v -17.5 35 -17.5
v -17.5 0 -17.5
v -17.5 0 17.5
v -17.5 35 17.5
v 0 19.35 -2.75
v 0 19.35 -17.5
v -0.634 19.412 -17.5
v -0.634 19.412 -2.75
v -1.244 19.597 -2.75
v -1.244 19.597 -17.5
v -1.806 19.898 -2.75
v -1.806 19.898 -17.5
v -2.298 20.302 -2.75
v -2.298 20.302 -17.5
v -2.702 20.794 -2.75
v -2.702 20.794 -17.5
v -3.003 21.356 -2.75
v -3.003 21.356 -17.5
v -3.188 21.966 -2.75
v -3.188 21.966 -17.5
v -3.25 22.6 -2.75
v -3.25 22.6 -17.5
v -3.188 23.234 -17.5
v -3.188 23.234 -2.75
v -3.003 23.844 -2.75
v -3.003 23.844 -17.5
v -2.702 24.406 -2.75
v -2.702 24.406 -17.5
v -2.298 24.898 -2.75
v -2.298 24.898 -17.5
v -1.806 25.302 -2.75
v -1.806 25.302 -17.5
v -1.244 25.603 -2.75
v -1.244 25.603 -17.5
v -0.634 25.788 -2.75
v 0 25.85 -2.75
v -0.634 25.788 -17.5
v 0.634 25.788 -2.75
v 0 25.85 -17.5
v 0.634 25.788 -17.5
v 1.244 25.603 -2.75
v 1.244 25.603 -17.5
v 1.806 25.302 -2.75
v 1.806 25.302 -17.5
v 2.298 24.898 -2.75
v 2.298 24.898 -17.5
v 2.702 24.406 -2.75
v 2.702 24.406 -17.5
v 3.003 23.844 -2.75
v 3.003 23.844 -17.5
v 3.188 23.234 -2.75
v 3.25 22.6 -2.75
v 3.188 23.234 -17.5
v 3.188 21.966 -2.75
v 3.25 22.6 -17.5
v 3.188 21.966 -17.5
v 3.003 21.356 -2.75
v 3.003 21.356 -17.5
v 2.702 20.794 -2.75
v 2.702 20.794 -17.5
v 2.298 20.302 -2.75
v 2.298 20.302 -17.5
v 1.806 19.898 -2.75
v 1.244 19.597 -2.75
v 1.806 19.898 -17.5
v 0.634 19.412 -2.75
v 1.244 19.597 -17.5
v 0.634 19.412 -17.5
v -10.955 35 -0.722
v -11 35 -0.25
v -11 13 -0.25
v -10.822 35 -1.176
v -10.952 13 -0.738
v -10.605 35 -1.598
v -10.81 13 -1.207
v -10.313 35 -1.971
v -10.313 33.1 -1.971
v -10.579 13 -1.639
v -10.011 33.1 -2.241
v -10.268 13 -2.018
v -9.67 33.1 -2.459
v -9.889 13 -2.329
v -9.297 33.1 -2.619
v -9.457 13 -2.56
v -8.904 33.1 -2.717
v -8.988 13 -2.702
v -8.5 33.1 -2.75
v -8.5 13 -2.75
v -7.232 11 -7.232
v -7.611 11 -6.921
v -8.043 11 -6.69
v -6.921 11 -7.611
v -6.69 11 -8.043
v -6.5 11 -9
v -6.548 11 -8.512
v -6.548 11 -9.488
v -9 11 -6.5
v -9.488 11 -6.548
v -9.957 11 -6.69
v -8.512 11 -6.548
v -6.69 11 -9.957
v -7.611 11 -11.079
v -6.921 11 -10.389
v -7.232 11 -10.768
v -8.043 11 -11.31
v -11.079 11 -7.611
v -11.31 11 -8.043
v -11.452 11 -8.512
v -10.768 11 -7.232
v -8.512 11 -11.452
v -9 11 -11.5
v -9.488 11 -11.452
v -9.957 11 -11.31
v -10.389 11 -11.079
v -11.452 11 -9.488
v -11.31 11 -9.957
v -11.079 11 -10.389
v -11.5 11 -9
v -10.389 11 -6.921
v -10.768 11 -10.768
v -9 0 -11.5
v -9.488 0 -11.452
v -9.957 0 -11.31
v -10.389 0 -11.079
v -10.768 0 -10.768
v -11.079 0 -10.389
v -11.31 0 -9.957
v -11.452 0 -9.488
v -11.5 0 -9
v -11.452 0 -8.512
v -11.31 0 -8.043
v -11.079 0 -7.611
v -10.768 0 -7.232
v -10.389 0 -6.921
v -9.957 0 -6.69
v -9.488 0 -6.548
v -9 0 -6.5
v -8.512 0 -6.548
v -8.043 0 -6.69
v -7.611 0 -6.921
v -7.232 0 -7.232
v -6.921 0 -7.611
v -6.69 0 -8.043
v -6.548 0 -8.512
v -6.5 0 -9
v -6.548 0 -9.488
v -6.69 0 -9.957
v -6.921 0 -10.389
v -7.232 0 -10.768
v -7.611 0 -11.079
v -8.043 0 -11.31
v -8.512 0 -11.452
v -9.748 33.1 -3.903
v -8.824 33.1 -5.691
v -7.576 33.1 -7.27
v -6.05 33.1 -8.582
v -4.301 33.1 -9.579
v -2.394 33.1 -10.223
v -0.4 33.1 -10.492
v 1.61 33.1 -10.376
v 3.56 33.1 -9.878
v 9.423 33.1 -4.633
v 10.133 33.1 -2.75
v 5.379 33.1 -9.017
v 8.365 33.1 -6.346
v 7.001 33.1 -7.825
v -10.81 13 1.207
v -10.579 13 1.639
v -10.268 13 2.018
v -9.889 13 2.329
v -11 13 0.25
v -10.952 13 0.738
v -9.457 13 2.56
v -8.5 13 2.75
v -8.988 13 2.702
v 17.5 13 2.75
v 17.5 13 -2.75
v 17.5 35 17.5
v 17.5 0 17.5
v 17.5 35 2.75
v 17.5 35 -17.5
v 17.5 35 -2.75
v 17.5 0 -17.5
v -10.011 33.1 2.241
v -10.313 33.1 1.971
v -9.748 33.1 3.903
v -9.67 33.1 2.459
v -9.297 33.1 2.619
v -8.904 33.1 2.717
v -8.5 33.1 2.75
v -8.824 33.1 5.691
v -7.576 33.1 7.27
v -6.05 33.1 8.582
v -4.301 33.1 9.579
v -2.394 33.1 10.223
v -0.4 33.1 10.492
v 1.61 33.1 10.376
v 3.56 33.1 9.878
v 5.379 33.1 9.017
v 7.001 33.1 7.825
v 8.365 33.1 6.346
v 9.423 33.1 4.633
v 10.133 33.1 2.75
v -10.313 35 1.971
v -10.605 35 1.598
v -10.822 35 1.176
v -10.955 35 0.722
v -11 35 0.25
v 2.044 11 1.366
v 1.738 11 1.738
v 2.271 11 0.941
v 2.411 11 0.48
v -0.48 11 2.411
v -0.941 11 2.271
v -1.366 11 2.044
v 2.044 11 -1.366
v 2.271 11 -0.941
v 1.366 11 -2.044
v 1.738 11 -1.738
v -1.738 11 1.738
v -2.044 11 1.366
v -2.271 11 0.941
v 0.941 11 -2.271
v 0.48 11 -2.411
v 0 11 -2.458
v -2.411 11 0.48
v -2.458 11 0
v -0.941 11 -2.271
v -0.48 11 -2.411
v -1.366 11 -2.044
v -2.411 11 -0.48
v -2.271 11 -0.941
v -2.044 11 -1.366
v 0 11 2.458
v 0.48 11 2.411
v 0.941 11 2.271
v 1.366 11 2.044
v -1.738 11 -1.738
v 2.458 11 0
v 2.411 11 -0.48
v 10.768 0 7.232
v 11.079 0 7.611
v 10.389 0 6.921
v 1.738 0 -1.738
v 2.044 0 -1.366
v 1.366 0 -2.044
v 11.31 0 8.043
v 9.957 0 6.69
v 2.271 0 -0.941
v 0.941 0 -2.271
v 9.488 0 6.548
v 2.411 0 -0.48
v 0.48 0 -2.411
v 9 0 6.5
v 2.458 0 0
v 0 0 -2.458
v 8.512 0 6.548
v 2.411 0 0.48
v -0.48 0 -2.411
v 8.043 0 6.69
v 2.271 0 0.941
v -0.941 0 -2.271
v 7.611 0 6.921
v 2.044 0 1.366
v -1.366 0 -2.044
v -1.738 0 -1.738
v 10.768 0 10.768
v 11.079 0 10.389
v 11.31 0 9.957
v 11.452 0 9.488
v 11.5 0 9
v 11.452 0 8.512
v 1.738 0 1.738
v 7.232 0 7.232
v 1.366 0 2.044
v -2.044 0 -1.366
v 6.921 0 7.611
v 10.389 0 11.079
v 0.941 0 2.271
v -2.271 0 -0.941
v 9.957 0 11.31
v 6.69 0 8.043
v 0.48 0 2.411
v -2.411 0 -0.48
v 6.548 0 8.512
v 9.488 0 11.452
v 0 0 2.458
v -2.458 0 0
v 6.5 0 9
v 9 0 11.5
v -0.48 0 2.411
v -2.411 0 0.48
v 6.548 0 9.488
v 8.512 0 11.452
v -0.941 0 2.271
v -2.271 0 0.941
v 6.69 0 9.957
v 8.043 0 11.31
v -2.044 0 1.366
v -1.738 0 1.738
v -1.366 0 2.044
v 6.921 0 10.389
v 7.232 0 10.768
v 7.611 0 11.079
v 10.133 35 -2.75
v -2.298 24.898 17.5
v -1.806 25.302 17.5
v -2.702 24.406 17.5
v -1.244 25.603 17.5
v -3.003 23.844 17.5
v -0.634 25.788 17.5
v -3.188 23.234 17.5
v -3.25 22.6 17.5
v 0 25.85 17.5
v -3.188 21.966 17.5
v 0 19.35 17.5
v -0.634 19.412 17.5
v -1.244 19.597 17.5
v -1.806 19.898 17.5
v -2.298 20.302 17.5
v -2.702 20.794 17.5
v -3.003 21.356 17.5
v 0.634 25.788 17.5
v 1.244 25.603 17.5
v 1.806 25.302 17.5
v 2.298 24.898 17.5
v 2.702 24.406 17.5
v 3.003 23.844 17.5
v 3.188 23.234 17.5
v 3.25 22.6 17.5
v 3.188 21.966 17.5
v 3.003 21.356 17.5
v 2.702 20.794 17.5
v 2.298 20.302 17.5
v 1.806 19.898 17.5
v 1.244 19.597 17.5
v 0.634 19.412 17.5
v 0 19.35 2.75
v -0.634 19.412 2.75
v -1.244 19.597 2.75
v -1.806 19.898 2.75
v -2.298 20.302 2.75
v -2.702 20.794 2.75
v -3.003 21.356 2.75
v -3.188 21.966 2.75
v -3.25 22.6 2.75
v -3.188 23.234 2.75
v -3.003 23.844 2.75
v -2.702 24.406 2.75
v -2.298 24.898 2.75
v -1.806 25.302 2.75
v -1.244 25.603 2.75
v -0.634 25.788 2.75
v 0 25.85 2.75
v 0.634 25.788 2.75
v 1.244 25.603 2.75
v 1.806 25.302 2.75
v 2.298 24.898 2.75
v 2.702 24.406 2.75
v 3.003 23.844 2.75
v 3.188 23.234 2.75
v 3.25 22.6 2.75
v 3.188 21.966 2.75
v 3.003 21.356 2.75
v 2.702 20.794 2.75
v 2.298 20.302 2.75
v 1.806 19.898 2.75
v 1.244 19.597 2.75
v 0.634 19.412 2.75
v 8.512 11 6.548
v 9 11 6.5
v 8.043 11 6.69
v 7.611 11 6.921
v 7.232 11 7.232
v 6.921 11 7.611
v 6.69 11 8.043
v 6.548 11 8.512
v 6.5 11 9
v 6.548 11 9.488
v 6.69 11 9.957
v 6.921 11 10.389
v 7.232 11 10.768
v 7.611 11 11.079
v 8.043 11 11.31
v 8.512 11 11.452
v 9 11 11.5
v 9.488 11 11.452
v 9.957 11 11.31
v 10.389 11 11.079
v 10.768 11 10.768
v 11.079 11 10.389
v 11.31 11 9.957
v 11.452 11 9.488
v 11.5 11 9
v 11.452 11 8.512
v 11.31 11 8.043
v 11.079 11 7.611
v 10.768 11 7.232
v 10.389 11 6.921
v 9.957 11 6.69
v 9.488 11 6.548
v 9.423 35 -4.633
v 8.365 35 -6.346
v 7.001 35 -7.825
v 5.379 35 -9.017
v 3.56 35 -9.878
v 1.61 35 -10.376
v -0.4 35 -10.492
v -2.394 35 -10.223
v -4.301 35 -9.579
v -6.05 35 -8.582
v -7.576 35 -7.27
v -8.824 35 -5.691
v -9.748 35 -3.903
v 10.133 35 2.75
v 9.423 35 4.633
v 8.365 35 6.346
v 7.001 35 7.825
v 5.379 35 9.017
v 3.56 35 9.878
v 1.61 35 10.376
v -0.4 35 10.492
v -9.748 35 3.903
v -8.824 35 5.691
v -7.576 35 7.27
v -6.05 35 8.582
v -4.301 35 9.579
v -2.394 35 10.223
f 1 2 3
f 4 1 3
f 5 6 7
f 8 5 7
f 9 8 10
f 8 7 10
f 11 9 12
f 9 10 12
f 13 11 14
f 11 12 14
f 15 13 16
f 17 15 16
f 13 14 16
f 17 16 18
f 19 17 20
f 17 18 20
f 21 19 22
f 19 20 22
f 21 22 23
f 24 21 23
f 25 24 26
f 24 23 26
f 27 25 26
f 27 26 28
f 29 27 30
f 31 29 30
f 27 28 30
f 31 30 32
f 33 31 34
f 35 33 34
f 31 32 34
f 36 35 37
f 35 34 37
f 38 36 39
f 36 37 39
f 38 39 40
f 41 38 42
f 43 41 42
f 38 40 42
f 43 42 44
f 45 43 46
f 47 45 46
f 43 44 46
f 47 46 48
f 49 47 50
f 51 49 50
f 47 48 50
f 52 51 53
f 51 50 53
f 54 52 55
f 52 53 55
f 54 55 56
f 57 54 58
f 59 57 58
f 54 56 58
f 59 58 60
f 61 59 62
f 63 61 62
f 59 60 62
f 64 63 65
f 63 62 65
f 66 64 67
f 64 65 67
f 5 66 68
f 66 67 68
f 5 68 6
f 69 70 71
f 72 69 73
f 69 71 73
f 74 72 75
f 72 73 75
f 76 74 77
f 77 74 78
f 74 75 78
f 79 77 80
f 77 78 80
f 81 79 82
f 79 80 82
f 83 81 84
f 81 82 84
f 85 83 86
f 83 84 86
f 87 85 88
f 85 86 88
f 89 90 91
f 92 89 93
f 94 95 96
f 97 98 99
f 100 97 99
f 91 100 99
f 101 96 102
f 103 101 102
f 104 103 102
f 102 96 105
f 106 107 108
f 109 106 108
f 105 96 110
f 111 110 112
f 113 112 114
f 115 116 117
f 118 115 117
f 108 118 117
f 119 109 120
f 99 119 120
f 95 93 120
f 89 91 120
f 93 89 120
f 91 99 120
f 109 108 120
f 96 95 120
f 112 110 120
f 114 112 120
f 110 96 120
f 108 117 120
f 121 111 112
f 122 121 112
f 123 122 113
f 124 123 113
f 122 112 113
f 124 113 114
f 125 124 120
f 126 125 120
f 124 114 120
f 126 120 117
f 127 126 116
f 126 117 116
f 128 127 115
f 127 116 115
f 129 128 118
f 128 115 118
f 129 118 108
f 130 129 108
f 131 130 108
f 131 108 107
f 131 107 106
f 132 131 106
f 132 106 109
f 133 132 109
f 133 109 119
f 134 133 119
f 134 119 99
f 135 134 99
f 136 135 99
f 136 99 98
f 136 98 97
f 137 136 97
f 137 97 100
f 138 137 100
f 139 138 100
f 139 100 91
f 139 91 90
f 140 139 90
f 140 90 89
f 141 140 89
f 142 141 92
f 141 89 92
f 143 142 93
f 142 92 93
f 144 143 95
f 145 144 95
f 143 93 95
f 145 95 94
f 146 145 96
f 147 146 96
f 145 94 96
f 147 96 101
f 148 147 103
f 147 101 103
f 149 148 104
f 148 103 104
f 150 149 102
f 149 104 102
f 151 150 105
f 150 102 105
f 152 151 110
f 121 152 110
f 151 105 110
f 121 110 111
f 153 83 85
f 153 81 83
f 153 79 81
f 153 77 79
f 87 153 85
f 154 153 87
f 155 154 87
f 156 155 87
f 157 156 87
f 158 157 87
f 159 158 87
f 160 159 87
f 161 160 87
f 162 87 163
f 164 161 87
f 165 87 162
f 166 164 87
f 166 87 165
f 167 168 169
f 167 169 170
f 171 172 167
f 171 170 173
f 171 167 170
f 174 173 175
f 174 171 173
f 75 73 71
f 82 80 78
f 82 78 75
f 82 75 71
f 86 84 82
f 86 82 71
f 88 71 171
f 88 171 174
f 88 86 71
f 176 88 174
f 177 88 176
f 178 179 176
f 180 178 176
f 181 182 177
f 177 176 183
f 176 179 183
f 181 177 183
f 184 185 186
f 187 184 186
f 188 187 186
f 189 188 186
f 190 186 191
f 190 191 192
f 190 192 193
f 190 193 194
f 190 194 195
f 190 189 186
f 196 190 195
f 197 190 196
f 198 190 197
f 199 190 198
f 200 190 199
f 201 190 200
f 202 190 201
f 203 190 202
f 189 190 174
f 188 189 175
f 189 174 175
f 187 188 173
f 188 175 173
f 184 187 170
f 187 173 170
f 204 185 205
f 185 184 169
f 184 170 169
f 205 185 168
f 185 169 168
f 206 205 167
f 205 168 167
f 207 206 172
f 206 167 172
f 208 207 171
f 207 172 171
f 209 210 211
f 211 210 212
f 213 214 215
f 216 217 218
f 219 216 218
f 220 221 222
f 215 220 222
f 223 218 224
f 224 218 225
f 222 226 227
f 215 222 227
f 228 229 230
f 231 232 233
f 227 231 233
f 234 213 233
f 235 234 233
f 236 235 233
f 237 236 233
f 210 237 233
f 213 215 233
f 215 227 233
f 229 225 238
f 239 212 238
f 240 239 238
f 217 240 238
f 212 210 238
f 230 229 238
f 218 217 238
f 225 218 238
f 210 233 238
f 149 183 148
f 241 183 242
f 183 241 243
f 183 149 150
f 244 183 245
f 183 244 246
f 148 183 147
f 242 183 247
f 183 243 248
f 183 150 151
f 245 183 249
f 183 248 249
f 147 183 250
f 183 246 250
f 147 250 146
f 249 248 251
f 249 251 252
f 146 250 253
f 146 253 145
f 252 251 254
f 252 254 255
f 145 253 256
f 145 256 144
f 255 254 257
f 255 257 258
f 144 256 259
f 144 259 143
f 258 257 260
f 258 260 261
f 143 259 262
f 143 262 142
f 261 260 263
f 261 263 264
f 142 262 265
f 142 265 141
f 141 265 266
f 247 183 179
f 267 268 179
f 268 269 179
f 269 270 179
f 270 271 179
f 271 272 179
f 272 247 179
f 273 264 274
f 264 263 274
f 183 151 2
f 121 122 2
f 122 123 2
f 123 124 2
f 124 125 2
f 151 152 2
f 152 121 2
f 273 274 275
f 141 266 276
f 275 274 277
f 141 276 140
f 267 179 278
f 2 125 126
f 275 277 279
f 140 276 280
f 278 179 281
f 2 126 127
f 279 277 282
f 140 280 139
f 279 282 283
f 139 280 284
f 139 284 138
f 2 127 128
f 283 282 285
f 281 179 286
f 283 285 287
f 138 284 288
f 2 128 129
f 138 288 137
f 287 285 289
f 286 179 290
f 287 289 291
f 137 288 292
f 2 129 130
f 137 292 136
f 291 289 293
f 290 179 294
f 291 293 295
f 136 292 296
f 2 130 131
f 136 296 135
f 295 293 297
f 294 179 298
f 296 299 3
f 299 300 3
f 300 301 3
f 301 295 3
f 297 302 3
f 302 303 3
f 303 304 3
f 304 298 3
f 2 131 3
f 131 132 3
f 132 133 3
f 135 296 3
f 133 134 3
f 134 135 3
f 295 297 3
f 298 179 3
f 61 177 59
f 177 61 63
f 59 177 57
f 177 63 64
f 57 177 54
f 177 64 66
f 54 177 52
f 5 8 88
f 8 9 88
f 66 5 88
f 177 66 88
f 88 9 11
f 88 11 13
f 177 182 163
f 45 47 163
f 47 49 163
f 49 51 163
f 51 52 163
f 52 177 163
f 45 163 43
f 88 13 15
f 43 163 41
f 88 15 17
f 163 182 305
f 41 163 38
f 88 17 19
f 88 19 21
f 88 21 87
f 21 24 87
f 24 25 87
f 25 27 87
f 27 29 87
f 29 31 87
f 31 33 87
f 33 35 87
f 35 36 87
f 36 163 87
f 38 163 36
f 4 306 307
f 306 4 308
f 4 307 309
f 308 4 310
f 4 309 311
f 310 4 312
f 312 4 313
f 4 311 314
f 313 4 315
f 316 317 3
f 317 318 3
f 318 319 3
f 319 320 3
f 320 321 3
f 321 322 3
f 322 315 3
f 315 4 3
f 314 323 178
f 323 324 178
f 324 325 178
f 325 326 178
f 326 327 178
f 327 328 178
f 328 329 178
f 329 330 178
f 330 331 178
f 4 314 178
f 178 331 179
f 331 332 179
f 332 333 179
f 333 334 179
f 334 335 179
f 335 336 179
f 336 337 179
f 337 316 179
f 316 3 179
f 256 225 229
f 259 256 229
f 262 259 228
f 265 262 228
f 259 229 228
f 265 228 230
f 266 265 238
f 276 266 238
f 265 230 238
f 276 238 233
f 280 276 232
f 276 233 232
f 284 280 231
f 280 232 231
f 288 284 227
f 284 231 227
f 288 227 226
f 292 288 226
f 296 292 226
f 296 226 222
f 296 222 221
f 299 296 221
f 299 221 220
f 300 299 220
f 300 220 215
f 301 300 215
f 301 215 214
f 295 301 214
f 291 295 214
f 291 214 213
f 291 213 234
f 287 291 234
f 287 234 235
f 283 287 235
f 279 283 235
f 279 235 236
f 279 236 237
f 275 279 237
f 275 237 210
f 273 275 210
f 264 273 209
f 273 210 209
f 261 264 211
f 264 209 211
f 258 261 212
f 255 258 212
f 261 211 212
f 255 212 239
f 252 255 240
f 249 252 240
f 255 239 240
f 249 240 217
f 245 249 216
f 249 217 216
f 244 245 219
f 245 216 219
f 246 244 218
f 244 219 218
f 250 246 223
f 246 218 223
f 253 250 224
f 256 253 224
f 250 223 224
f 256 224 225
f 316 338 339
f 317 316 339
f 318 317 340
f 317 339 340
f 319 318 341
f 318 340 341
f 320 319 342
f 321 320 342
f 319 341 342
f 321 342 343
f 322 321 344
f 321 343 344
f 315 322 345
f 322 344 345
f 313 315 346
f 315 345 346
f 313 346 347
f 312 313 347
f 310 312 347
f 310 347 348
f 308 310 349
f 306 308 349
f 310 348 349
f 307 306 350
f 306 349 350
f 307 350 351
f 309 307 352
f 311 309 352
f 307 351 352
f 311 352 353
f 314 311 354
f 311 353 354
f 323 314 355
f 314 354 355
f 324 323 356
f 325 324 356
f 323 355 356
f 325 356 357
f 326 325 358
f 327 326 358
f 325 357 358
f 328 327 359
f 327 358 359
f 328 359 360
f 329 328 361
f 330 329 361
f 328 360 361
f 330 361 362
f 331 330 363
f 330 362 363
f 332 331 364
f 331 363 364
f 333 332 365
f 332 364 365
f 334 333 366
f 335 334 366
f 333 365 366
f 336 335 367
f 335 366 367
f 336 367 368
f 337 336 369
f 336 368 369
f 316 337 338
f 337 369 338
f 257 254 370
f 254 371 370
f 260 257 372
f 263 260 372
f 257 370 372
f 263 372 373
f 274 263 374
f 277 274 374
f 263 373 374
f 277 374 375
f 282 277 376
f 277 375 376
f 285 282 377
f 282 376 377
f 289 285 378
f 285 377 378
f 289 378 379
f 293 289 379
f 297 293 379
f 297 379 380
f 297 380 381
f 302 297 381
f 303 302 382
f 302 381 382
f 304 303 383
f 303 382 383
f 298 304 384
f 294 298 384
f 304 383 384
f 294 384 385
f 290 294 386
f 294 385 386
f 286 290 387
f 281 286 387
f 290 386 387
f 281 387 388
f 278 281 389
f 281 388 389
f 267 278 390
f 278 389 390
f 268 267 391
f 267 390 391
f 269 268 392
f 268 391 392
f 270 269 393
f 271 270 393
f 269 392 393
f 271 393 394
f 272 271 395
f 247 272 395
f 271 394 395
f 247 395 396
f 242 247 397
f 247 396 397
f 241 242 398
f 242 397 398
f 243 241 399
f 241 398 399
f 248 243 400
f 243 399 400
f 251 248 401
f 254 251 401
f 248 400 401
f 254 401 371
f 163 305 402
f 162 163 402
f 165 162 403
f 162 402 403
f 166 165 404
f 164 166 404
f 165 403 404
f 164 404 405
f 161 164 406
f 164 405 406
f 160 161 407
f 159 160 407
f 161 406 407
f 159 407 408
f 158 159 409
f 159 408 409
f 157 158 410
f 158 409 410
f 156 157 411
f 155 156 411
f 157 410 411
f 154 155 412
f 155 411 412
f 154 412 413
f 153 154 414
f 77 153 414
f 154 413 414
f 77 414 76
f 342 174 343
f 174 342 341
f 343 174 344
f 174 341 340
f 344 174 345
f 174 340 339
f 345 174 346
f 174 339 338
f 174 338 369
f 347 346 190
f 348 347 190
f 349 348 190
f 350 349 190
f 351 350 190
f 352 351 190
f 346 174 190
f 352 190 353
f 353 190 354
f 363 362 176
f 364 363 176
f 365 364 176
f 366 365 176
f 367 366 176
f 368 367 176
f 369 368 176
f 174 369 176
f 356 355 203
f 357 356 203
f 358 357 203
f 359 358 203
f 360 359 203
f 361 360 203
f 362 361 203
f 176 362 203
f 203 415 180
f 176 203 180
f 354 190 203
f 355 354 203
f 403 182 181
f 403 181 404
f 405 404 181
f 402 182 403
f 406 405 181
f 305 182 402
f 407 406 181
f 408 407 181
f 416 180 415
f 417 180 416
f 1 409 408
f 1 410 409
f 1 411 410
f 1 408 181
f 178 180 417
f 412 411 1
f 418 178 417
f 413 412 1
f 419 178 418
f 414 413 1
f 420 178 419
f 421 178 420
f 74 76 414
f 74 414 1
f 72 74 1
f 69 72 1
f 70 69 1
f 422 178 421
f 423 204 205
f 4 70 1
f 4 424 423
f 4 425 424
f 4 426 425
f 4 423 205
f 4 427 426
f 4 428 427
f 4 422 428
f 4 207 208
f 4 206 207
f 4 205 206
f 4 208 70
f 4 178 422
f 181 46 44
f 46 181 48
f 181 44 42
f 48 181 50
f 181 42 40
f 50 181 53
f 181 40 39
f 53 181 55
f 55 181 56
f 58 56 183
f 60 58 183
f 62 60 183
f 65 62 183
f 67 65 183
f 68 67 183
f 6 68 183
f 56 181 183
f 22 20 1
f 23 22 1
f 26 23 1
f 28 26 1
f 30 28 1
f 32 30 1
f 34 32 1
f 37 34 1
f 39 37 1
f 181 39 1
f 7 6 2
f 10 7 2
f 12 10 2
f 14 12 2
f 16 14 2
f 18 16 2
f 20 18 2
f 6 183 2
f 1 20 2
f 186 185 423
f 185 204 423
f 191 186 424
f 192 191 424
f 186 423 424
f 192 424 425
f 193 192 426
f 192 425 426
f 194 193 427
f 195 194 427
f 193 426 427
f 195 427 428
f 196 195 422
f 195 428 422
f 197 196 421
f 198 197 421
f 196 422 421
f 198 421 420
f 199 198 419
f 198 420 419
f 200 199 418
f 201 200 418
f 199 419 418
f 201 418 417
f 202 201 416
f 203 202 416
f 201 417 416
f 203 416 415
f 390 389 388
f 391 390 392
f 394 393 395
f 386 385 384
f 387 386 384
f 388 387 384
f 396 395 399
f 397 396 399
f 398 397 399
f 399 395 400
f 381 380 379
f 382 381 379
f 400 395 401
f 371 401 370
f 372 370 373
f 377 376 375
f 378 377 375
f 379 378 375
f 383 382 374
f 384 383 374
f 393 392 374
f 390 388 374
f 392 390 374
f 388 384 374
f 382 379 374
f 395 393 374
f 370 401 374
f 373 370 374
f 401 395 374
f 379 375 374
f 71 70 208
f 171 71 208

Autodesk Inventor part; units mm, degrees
ref_plane "YZ Plane" through (0, 0, 0) normal (1, 0, 0) x (0, 1, 0)
ref_plane "XZ Plane" through (0, 0, 0) normal (0, 1, 0) x (-1, 0, 0)
ref_plane "XY Plane" through (0, 0, 0) normal (0, 0, 1) x (1, 0, 0)
sketch "Sketch1" plane through (0, 0, 0) normal (0, 1, 0) x (-1, 0, 0)
  line L0 (17.5, 17.5) -> (-17.5, 17.5)
  line L1 (-17.5, 17.5) -> (-17.5, -17.5)
  line L2 (-17.5, -17.5) -> (17.5, -17.5)
  line L3 (17.5, -17.5) -> (17.5, 17.5)
  line L4 (17.5, 17.5) -> (-17.5, -17.5) construction
  line L5 (-17.5, 17.5) -> (17.5, -17.5) construction
  point P0 (0, 0)
  dimension "d0" = 35
  dimension "d1" = 35
extrude "Extrusion1" add sketch "Sketch1" along normal blind 35
sketch "Sketch2" plane through (0, 35, 0) normal (0, 1, 0) x (1, 0, 0)
  line L0 (-2.3616, -50.7705) -> (15.6384, -50.7705)
  line L1 (15.6384, -50.7705) -> (15.6384, -44.7705)
  line L2 (15.6384, -44.7705) -> (-2.3616, -44.7705)
  line L3 (-2.3616, -44.7705) -> (-2.3616, -50.7705)
  line L4 (-2.3616, -50.7705) -> (15.6384, -44.7705) construction
  line L5 (15.6384, -50.7705) -> (-2.3616, -44.7705) construction
  circle A0 centre (6.6384, -47.7705) radius 11
  line L6 (-10.8616, -65.2705) -> (24.1384, -65.2705)
  line L7 (24.1384, -65.2705) -> (24.1384, -30.2705)
  line L8 (24.1384, -30.2705) -> (-10.8616, -30.2705)
  line L9 (-10.8616, -30.2705) -> (-10.8616, -65.2705)
  line L10 (-10.8616, -65.2705) -> (24.1384, -30.2705) construction
  line L11 (24.1384, -65.2705) -> (-10.8616, -30.2705) construction
  circle A1 centre (6.6384, -47.7705) radius 28.5
  circle A2 centre (0, 0) radius 10.5
  line L12 (-8.5, 2.75) -> (8.5, 2.75)
  line L13 (8.5, 2.75) -> (8.5, -2.75)
  line L14 (8.5, -2.75) -> (-8.5, -2.75)
  line L15 (-8.5, -2.75) -> (-8.5, 2.75)
  line L16 (-8.5, 2.75) -> (8.5, -2.75) construction
  line L17 (8.5, 2.75) -> (-8.5, -2.75) construction
  point P0 (-38.3616, 79.7295)
  dimension "d4" = 18
  dimension "d5" = 6
  dimension "d6" = 22
  dimension "d7" = 35
  dimension "d8" = 35
  dimension "d9" = 21
  dimension "d10" = 17
  dimension "d11" = 5.5
extrude "Extrusion2" cut sketch "Sketch2" against normal blind 22 contours L12 L13 L14 L15
extrude "Extrusion3" cut sketch "Sketch2" against normal blind 1.9 contours A2
sketch "Sketch3" plane through (-17.5, 0, 17.5) normal (0, 0, 1) x (1, 0, 0)
  line L0 (7, 35) -> (28, 35) construction
  line L1 (17.5, 35) -> (17.5, 22.6) construction
  point P0 (17.5, 0)
  dimension "d16" = 12.4
hole "Hole1" at (0, 22.6, 17.5) direction (0, 0, -1) diameter 6.5 end through all clearance for "Hex Head Cap Screw ISO 24017" size "M6" standard "ISO"
sketch "Sketch4" plane through (0, 0, 0) normal (0, -1, 0) x (1, 0, 0)
  point P0 (0, 0)
hole "Hole2" at (0, 0, 0) direction (0, 1, 0) diameter 4.917 depth 11 thread size "M6x1" class "6H" standard "ANSI Metric M Profile"
sketch "Sketch6" plane through (0, 0, 0) normal (0, -1, 0) x (1, 0, 0)
  line L0 (-17.5, -17.5) -> (-17.5, 17.5) construction
  line L1 (17.5, 17.5) -> (-17.5, 17.5) construction
  line L2 (-17.5, 17.5) -> (-17.5, -17.5) construction
  line L3 (-17.5, -17.5) -> (17.5, -17.5) construction
  line L4 (17.5, -17.5) -> (17.5, 17.5) construction
  line L5 (17.5, 17.5) -> (-17.5, -17.5) construction
  line L6 (-17.5, 17.5) -> (17.5, -17.5) construction
  line L7 (9, -9) -> (-9, -9) construction
  line L8 (-9, -9) -> (-9, 9) construction
  line L9 (-9, 9) -> (9, 9) construction
  line L10 (9, 9) -> (9, -9) construction
  line L11 (9, -9) -> (-9, 9) construction
  line L12 (-9, -9) -> (9, 9) construction
  point P0 (0, 0)
  dimension "d63" = 18
  dimension "d64" = 18
hole "Hole3" at (9, 0, 9) at (-9, 0, -9) direction (0, 1, 0) diameter 5 depth 11
sketch "Sketch7" plane through (0, 35, 0) normal (0, 1, 0) x (1, 0, 0)
  line L0 (-8.5, 2.75) -> (8.5, 2.75) construction
  line L1 (8.5, 2.75) -> (17.5, 2.75) construction
  line L2 (17.5, -17.5) -> (17.5, 17.5) construction
  line L3 (8.5, 2.75) -> (8.5, -2.75) projected
  line L4 (17.5, 2.75) -> (8.5, 2.75)
  line L5 (8.5, 2.75) -> (8.5, -2.75)
  line L6 (8.5, -2.75) -> (17.5, -2.75)
  line L7 (17.5, -2.75) -> (17.5, 2.75)
  point P0 (0, 0)
extrude "Extrusion4" cut sketch "Sketch7" against normal up to surface (22 mm away)
sketch "Sketch8" plane through (0, 35, 0) normal (0, 1, 0) x (1, 0, 0)
  line L0 (17.5, 2.75) -> (-8.5, 2.75) projected
  line L1 (-8.5, 2.75) -> (-11, 2.75)
  line L2 (-11, 2.75) -> (-11, -2.75)
  line L3 (-11, -2.75) -> (-8.5, -2.75)
  line L4 (-8.5, -2.75) -> (-8.5, 2.75)
  line L5 (-8.5, 2.75) -> (-10.1335, 2.75) construction
  arc A0 (10.1335, 2.75) -> (10.1335, -2.75) centre (0, 0) ccw construction
  dimension "d44" = 2.5
  dimension "d45" = 1.6335
extrude "Extrusion5" cut sketch "Sketch8" against normal up to surface (22 mm away)
fillet "Fillet2" radius 2.5 2 edges at (-11, 24, 2.75) (-11, 24, -2.75)
properties part number "Holder"
